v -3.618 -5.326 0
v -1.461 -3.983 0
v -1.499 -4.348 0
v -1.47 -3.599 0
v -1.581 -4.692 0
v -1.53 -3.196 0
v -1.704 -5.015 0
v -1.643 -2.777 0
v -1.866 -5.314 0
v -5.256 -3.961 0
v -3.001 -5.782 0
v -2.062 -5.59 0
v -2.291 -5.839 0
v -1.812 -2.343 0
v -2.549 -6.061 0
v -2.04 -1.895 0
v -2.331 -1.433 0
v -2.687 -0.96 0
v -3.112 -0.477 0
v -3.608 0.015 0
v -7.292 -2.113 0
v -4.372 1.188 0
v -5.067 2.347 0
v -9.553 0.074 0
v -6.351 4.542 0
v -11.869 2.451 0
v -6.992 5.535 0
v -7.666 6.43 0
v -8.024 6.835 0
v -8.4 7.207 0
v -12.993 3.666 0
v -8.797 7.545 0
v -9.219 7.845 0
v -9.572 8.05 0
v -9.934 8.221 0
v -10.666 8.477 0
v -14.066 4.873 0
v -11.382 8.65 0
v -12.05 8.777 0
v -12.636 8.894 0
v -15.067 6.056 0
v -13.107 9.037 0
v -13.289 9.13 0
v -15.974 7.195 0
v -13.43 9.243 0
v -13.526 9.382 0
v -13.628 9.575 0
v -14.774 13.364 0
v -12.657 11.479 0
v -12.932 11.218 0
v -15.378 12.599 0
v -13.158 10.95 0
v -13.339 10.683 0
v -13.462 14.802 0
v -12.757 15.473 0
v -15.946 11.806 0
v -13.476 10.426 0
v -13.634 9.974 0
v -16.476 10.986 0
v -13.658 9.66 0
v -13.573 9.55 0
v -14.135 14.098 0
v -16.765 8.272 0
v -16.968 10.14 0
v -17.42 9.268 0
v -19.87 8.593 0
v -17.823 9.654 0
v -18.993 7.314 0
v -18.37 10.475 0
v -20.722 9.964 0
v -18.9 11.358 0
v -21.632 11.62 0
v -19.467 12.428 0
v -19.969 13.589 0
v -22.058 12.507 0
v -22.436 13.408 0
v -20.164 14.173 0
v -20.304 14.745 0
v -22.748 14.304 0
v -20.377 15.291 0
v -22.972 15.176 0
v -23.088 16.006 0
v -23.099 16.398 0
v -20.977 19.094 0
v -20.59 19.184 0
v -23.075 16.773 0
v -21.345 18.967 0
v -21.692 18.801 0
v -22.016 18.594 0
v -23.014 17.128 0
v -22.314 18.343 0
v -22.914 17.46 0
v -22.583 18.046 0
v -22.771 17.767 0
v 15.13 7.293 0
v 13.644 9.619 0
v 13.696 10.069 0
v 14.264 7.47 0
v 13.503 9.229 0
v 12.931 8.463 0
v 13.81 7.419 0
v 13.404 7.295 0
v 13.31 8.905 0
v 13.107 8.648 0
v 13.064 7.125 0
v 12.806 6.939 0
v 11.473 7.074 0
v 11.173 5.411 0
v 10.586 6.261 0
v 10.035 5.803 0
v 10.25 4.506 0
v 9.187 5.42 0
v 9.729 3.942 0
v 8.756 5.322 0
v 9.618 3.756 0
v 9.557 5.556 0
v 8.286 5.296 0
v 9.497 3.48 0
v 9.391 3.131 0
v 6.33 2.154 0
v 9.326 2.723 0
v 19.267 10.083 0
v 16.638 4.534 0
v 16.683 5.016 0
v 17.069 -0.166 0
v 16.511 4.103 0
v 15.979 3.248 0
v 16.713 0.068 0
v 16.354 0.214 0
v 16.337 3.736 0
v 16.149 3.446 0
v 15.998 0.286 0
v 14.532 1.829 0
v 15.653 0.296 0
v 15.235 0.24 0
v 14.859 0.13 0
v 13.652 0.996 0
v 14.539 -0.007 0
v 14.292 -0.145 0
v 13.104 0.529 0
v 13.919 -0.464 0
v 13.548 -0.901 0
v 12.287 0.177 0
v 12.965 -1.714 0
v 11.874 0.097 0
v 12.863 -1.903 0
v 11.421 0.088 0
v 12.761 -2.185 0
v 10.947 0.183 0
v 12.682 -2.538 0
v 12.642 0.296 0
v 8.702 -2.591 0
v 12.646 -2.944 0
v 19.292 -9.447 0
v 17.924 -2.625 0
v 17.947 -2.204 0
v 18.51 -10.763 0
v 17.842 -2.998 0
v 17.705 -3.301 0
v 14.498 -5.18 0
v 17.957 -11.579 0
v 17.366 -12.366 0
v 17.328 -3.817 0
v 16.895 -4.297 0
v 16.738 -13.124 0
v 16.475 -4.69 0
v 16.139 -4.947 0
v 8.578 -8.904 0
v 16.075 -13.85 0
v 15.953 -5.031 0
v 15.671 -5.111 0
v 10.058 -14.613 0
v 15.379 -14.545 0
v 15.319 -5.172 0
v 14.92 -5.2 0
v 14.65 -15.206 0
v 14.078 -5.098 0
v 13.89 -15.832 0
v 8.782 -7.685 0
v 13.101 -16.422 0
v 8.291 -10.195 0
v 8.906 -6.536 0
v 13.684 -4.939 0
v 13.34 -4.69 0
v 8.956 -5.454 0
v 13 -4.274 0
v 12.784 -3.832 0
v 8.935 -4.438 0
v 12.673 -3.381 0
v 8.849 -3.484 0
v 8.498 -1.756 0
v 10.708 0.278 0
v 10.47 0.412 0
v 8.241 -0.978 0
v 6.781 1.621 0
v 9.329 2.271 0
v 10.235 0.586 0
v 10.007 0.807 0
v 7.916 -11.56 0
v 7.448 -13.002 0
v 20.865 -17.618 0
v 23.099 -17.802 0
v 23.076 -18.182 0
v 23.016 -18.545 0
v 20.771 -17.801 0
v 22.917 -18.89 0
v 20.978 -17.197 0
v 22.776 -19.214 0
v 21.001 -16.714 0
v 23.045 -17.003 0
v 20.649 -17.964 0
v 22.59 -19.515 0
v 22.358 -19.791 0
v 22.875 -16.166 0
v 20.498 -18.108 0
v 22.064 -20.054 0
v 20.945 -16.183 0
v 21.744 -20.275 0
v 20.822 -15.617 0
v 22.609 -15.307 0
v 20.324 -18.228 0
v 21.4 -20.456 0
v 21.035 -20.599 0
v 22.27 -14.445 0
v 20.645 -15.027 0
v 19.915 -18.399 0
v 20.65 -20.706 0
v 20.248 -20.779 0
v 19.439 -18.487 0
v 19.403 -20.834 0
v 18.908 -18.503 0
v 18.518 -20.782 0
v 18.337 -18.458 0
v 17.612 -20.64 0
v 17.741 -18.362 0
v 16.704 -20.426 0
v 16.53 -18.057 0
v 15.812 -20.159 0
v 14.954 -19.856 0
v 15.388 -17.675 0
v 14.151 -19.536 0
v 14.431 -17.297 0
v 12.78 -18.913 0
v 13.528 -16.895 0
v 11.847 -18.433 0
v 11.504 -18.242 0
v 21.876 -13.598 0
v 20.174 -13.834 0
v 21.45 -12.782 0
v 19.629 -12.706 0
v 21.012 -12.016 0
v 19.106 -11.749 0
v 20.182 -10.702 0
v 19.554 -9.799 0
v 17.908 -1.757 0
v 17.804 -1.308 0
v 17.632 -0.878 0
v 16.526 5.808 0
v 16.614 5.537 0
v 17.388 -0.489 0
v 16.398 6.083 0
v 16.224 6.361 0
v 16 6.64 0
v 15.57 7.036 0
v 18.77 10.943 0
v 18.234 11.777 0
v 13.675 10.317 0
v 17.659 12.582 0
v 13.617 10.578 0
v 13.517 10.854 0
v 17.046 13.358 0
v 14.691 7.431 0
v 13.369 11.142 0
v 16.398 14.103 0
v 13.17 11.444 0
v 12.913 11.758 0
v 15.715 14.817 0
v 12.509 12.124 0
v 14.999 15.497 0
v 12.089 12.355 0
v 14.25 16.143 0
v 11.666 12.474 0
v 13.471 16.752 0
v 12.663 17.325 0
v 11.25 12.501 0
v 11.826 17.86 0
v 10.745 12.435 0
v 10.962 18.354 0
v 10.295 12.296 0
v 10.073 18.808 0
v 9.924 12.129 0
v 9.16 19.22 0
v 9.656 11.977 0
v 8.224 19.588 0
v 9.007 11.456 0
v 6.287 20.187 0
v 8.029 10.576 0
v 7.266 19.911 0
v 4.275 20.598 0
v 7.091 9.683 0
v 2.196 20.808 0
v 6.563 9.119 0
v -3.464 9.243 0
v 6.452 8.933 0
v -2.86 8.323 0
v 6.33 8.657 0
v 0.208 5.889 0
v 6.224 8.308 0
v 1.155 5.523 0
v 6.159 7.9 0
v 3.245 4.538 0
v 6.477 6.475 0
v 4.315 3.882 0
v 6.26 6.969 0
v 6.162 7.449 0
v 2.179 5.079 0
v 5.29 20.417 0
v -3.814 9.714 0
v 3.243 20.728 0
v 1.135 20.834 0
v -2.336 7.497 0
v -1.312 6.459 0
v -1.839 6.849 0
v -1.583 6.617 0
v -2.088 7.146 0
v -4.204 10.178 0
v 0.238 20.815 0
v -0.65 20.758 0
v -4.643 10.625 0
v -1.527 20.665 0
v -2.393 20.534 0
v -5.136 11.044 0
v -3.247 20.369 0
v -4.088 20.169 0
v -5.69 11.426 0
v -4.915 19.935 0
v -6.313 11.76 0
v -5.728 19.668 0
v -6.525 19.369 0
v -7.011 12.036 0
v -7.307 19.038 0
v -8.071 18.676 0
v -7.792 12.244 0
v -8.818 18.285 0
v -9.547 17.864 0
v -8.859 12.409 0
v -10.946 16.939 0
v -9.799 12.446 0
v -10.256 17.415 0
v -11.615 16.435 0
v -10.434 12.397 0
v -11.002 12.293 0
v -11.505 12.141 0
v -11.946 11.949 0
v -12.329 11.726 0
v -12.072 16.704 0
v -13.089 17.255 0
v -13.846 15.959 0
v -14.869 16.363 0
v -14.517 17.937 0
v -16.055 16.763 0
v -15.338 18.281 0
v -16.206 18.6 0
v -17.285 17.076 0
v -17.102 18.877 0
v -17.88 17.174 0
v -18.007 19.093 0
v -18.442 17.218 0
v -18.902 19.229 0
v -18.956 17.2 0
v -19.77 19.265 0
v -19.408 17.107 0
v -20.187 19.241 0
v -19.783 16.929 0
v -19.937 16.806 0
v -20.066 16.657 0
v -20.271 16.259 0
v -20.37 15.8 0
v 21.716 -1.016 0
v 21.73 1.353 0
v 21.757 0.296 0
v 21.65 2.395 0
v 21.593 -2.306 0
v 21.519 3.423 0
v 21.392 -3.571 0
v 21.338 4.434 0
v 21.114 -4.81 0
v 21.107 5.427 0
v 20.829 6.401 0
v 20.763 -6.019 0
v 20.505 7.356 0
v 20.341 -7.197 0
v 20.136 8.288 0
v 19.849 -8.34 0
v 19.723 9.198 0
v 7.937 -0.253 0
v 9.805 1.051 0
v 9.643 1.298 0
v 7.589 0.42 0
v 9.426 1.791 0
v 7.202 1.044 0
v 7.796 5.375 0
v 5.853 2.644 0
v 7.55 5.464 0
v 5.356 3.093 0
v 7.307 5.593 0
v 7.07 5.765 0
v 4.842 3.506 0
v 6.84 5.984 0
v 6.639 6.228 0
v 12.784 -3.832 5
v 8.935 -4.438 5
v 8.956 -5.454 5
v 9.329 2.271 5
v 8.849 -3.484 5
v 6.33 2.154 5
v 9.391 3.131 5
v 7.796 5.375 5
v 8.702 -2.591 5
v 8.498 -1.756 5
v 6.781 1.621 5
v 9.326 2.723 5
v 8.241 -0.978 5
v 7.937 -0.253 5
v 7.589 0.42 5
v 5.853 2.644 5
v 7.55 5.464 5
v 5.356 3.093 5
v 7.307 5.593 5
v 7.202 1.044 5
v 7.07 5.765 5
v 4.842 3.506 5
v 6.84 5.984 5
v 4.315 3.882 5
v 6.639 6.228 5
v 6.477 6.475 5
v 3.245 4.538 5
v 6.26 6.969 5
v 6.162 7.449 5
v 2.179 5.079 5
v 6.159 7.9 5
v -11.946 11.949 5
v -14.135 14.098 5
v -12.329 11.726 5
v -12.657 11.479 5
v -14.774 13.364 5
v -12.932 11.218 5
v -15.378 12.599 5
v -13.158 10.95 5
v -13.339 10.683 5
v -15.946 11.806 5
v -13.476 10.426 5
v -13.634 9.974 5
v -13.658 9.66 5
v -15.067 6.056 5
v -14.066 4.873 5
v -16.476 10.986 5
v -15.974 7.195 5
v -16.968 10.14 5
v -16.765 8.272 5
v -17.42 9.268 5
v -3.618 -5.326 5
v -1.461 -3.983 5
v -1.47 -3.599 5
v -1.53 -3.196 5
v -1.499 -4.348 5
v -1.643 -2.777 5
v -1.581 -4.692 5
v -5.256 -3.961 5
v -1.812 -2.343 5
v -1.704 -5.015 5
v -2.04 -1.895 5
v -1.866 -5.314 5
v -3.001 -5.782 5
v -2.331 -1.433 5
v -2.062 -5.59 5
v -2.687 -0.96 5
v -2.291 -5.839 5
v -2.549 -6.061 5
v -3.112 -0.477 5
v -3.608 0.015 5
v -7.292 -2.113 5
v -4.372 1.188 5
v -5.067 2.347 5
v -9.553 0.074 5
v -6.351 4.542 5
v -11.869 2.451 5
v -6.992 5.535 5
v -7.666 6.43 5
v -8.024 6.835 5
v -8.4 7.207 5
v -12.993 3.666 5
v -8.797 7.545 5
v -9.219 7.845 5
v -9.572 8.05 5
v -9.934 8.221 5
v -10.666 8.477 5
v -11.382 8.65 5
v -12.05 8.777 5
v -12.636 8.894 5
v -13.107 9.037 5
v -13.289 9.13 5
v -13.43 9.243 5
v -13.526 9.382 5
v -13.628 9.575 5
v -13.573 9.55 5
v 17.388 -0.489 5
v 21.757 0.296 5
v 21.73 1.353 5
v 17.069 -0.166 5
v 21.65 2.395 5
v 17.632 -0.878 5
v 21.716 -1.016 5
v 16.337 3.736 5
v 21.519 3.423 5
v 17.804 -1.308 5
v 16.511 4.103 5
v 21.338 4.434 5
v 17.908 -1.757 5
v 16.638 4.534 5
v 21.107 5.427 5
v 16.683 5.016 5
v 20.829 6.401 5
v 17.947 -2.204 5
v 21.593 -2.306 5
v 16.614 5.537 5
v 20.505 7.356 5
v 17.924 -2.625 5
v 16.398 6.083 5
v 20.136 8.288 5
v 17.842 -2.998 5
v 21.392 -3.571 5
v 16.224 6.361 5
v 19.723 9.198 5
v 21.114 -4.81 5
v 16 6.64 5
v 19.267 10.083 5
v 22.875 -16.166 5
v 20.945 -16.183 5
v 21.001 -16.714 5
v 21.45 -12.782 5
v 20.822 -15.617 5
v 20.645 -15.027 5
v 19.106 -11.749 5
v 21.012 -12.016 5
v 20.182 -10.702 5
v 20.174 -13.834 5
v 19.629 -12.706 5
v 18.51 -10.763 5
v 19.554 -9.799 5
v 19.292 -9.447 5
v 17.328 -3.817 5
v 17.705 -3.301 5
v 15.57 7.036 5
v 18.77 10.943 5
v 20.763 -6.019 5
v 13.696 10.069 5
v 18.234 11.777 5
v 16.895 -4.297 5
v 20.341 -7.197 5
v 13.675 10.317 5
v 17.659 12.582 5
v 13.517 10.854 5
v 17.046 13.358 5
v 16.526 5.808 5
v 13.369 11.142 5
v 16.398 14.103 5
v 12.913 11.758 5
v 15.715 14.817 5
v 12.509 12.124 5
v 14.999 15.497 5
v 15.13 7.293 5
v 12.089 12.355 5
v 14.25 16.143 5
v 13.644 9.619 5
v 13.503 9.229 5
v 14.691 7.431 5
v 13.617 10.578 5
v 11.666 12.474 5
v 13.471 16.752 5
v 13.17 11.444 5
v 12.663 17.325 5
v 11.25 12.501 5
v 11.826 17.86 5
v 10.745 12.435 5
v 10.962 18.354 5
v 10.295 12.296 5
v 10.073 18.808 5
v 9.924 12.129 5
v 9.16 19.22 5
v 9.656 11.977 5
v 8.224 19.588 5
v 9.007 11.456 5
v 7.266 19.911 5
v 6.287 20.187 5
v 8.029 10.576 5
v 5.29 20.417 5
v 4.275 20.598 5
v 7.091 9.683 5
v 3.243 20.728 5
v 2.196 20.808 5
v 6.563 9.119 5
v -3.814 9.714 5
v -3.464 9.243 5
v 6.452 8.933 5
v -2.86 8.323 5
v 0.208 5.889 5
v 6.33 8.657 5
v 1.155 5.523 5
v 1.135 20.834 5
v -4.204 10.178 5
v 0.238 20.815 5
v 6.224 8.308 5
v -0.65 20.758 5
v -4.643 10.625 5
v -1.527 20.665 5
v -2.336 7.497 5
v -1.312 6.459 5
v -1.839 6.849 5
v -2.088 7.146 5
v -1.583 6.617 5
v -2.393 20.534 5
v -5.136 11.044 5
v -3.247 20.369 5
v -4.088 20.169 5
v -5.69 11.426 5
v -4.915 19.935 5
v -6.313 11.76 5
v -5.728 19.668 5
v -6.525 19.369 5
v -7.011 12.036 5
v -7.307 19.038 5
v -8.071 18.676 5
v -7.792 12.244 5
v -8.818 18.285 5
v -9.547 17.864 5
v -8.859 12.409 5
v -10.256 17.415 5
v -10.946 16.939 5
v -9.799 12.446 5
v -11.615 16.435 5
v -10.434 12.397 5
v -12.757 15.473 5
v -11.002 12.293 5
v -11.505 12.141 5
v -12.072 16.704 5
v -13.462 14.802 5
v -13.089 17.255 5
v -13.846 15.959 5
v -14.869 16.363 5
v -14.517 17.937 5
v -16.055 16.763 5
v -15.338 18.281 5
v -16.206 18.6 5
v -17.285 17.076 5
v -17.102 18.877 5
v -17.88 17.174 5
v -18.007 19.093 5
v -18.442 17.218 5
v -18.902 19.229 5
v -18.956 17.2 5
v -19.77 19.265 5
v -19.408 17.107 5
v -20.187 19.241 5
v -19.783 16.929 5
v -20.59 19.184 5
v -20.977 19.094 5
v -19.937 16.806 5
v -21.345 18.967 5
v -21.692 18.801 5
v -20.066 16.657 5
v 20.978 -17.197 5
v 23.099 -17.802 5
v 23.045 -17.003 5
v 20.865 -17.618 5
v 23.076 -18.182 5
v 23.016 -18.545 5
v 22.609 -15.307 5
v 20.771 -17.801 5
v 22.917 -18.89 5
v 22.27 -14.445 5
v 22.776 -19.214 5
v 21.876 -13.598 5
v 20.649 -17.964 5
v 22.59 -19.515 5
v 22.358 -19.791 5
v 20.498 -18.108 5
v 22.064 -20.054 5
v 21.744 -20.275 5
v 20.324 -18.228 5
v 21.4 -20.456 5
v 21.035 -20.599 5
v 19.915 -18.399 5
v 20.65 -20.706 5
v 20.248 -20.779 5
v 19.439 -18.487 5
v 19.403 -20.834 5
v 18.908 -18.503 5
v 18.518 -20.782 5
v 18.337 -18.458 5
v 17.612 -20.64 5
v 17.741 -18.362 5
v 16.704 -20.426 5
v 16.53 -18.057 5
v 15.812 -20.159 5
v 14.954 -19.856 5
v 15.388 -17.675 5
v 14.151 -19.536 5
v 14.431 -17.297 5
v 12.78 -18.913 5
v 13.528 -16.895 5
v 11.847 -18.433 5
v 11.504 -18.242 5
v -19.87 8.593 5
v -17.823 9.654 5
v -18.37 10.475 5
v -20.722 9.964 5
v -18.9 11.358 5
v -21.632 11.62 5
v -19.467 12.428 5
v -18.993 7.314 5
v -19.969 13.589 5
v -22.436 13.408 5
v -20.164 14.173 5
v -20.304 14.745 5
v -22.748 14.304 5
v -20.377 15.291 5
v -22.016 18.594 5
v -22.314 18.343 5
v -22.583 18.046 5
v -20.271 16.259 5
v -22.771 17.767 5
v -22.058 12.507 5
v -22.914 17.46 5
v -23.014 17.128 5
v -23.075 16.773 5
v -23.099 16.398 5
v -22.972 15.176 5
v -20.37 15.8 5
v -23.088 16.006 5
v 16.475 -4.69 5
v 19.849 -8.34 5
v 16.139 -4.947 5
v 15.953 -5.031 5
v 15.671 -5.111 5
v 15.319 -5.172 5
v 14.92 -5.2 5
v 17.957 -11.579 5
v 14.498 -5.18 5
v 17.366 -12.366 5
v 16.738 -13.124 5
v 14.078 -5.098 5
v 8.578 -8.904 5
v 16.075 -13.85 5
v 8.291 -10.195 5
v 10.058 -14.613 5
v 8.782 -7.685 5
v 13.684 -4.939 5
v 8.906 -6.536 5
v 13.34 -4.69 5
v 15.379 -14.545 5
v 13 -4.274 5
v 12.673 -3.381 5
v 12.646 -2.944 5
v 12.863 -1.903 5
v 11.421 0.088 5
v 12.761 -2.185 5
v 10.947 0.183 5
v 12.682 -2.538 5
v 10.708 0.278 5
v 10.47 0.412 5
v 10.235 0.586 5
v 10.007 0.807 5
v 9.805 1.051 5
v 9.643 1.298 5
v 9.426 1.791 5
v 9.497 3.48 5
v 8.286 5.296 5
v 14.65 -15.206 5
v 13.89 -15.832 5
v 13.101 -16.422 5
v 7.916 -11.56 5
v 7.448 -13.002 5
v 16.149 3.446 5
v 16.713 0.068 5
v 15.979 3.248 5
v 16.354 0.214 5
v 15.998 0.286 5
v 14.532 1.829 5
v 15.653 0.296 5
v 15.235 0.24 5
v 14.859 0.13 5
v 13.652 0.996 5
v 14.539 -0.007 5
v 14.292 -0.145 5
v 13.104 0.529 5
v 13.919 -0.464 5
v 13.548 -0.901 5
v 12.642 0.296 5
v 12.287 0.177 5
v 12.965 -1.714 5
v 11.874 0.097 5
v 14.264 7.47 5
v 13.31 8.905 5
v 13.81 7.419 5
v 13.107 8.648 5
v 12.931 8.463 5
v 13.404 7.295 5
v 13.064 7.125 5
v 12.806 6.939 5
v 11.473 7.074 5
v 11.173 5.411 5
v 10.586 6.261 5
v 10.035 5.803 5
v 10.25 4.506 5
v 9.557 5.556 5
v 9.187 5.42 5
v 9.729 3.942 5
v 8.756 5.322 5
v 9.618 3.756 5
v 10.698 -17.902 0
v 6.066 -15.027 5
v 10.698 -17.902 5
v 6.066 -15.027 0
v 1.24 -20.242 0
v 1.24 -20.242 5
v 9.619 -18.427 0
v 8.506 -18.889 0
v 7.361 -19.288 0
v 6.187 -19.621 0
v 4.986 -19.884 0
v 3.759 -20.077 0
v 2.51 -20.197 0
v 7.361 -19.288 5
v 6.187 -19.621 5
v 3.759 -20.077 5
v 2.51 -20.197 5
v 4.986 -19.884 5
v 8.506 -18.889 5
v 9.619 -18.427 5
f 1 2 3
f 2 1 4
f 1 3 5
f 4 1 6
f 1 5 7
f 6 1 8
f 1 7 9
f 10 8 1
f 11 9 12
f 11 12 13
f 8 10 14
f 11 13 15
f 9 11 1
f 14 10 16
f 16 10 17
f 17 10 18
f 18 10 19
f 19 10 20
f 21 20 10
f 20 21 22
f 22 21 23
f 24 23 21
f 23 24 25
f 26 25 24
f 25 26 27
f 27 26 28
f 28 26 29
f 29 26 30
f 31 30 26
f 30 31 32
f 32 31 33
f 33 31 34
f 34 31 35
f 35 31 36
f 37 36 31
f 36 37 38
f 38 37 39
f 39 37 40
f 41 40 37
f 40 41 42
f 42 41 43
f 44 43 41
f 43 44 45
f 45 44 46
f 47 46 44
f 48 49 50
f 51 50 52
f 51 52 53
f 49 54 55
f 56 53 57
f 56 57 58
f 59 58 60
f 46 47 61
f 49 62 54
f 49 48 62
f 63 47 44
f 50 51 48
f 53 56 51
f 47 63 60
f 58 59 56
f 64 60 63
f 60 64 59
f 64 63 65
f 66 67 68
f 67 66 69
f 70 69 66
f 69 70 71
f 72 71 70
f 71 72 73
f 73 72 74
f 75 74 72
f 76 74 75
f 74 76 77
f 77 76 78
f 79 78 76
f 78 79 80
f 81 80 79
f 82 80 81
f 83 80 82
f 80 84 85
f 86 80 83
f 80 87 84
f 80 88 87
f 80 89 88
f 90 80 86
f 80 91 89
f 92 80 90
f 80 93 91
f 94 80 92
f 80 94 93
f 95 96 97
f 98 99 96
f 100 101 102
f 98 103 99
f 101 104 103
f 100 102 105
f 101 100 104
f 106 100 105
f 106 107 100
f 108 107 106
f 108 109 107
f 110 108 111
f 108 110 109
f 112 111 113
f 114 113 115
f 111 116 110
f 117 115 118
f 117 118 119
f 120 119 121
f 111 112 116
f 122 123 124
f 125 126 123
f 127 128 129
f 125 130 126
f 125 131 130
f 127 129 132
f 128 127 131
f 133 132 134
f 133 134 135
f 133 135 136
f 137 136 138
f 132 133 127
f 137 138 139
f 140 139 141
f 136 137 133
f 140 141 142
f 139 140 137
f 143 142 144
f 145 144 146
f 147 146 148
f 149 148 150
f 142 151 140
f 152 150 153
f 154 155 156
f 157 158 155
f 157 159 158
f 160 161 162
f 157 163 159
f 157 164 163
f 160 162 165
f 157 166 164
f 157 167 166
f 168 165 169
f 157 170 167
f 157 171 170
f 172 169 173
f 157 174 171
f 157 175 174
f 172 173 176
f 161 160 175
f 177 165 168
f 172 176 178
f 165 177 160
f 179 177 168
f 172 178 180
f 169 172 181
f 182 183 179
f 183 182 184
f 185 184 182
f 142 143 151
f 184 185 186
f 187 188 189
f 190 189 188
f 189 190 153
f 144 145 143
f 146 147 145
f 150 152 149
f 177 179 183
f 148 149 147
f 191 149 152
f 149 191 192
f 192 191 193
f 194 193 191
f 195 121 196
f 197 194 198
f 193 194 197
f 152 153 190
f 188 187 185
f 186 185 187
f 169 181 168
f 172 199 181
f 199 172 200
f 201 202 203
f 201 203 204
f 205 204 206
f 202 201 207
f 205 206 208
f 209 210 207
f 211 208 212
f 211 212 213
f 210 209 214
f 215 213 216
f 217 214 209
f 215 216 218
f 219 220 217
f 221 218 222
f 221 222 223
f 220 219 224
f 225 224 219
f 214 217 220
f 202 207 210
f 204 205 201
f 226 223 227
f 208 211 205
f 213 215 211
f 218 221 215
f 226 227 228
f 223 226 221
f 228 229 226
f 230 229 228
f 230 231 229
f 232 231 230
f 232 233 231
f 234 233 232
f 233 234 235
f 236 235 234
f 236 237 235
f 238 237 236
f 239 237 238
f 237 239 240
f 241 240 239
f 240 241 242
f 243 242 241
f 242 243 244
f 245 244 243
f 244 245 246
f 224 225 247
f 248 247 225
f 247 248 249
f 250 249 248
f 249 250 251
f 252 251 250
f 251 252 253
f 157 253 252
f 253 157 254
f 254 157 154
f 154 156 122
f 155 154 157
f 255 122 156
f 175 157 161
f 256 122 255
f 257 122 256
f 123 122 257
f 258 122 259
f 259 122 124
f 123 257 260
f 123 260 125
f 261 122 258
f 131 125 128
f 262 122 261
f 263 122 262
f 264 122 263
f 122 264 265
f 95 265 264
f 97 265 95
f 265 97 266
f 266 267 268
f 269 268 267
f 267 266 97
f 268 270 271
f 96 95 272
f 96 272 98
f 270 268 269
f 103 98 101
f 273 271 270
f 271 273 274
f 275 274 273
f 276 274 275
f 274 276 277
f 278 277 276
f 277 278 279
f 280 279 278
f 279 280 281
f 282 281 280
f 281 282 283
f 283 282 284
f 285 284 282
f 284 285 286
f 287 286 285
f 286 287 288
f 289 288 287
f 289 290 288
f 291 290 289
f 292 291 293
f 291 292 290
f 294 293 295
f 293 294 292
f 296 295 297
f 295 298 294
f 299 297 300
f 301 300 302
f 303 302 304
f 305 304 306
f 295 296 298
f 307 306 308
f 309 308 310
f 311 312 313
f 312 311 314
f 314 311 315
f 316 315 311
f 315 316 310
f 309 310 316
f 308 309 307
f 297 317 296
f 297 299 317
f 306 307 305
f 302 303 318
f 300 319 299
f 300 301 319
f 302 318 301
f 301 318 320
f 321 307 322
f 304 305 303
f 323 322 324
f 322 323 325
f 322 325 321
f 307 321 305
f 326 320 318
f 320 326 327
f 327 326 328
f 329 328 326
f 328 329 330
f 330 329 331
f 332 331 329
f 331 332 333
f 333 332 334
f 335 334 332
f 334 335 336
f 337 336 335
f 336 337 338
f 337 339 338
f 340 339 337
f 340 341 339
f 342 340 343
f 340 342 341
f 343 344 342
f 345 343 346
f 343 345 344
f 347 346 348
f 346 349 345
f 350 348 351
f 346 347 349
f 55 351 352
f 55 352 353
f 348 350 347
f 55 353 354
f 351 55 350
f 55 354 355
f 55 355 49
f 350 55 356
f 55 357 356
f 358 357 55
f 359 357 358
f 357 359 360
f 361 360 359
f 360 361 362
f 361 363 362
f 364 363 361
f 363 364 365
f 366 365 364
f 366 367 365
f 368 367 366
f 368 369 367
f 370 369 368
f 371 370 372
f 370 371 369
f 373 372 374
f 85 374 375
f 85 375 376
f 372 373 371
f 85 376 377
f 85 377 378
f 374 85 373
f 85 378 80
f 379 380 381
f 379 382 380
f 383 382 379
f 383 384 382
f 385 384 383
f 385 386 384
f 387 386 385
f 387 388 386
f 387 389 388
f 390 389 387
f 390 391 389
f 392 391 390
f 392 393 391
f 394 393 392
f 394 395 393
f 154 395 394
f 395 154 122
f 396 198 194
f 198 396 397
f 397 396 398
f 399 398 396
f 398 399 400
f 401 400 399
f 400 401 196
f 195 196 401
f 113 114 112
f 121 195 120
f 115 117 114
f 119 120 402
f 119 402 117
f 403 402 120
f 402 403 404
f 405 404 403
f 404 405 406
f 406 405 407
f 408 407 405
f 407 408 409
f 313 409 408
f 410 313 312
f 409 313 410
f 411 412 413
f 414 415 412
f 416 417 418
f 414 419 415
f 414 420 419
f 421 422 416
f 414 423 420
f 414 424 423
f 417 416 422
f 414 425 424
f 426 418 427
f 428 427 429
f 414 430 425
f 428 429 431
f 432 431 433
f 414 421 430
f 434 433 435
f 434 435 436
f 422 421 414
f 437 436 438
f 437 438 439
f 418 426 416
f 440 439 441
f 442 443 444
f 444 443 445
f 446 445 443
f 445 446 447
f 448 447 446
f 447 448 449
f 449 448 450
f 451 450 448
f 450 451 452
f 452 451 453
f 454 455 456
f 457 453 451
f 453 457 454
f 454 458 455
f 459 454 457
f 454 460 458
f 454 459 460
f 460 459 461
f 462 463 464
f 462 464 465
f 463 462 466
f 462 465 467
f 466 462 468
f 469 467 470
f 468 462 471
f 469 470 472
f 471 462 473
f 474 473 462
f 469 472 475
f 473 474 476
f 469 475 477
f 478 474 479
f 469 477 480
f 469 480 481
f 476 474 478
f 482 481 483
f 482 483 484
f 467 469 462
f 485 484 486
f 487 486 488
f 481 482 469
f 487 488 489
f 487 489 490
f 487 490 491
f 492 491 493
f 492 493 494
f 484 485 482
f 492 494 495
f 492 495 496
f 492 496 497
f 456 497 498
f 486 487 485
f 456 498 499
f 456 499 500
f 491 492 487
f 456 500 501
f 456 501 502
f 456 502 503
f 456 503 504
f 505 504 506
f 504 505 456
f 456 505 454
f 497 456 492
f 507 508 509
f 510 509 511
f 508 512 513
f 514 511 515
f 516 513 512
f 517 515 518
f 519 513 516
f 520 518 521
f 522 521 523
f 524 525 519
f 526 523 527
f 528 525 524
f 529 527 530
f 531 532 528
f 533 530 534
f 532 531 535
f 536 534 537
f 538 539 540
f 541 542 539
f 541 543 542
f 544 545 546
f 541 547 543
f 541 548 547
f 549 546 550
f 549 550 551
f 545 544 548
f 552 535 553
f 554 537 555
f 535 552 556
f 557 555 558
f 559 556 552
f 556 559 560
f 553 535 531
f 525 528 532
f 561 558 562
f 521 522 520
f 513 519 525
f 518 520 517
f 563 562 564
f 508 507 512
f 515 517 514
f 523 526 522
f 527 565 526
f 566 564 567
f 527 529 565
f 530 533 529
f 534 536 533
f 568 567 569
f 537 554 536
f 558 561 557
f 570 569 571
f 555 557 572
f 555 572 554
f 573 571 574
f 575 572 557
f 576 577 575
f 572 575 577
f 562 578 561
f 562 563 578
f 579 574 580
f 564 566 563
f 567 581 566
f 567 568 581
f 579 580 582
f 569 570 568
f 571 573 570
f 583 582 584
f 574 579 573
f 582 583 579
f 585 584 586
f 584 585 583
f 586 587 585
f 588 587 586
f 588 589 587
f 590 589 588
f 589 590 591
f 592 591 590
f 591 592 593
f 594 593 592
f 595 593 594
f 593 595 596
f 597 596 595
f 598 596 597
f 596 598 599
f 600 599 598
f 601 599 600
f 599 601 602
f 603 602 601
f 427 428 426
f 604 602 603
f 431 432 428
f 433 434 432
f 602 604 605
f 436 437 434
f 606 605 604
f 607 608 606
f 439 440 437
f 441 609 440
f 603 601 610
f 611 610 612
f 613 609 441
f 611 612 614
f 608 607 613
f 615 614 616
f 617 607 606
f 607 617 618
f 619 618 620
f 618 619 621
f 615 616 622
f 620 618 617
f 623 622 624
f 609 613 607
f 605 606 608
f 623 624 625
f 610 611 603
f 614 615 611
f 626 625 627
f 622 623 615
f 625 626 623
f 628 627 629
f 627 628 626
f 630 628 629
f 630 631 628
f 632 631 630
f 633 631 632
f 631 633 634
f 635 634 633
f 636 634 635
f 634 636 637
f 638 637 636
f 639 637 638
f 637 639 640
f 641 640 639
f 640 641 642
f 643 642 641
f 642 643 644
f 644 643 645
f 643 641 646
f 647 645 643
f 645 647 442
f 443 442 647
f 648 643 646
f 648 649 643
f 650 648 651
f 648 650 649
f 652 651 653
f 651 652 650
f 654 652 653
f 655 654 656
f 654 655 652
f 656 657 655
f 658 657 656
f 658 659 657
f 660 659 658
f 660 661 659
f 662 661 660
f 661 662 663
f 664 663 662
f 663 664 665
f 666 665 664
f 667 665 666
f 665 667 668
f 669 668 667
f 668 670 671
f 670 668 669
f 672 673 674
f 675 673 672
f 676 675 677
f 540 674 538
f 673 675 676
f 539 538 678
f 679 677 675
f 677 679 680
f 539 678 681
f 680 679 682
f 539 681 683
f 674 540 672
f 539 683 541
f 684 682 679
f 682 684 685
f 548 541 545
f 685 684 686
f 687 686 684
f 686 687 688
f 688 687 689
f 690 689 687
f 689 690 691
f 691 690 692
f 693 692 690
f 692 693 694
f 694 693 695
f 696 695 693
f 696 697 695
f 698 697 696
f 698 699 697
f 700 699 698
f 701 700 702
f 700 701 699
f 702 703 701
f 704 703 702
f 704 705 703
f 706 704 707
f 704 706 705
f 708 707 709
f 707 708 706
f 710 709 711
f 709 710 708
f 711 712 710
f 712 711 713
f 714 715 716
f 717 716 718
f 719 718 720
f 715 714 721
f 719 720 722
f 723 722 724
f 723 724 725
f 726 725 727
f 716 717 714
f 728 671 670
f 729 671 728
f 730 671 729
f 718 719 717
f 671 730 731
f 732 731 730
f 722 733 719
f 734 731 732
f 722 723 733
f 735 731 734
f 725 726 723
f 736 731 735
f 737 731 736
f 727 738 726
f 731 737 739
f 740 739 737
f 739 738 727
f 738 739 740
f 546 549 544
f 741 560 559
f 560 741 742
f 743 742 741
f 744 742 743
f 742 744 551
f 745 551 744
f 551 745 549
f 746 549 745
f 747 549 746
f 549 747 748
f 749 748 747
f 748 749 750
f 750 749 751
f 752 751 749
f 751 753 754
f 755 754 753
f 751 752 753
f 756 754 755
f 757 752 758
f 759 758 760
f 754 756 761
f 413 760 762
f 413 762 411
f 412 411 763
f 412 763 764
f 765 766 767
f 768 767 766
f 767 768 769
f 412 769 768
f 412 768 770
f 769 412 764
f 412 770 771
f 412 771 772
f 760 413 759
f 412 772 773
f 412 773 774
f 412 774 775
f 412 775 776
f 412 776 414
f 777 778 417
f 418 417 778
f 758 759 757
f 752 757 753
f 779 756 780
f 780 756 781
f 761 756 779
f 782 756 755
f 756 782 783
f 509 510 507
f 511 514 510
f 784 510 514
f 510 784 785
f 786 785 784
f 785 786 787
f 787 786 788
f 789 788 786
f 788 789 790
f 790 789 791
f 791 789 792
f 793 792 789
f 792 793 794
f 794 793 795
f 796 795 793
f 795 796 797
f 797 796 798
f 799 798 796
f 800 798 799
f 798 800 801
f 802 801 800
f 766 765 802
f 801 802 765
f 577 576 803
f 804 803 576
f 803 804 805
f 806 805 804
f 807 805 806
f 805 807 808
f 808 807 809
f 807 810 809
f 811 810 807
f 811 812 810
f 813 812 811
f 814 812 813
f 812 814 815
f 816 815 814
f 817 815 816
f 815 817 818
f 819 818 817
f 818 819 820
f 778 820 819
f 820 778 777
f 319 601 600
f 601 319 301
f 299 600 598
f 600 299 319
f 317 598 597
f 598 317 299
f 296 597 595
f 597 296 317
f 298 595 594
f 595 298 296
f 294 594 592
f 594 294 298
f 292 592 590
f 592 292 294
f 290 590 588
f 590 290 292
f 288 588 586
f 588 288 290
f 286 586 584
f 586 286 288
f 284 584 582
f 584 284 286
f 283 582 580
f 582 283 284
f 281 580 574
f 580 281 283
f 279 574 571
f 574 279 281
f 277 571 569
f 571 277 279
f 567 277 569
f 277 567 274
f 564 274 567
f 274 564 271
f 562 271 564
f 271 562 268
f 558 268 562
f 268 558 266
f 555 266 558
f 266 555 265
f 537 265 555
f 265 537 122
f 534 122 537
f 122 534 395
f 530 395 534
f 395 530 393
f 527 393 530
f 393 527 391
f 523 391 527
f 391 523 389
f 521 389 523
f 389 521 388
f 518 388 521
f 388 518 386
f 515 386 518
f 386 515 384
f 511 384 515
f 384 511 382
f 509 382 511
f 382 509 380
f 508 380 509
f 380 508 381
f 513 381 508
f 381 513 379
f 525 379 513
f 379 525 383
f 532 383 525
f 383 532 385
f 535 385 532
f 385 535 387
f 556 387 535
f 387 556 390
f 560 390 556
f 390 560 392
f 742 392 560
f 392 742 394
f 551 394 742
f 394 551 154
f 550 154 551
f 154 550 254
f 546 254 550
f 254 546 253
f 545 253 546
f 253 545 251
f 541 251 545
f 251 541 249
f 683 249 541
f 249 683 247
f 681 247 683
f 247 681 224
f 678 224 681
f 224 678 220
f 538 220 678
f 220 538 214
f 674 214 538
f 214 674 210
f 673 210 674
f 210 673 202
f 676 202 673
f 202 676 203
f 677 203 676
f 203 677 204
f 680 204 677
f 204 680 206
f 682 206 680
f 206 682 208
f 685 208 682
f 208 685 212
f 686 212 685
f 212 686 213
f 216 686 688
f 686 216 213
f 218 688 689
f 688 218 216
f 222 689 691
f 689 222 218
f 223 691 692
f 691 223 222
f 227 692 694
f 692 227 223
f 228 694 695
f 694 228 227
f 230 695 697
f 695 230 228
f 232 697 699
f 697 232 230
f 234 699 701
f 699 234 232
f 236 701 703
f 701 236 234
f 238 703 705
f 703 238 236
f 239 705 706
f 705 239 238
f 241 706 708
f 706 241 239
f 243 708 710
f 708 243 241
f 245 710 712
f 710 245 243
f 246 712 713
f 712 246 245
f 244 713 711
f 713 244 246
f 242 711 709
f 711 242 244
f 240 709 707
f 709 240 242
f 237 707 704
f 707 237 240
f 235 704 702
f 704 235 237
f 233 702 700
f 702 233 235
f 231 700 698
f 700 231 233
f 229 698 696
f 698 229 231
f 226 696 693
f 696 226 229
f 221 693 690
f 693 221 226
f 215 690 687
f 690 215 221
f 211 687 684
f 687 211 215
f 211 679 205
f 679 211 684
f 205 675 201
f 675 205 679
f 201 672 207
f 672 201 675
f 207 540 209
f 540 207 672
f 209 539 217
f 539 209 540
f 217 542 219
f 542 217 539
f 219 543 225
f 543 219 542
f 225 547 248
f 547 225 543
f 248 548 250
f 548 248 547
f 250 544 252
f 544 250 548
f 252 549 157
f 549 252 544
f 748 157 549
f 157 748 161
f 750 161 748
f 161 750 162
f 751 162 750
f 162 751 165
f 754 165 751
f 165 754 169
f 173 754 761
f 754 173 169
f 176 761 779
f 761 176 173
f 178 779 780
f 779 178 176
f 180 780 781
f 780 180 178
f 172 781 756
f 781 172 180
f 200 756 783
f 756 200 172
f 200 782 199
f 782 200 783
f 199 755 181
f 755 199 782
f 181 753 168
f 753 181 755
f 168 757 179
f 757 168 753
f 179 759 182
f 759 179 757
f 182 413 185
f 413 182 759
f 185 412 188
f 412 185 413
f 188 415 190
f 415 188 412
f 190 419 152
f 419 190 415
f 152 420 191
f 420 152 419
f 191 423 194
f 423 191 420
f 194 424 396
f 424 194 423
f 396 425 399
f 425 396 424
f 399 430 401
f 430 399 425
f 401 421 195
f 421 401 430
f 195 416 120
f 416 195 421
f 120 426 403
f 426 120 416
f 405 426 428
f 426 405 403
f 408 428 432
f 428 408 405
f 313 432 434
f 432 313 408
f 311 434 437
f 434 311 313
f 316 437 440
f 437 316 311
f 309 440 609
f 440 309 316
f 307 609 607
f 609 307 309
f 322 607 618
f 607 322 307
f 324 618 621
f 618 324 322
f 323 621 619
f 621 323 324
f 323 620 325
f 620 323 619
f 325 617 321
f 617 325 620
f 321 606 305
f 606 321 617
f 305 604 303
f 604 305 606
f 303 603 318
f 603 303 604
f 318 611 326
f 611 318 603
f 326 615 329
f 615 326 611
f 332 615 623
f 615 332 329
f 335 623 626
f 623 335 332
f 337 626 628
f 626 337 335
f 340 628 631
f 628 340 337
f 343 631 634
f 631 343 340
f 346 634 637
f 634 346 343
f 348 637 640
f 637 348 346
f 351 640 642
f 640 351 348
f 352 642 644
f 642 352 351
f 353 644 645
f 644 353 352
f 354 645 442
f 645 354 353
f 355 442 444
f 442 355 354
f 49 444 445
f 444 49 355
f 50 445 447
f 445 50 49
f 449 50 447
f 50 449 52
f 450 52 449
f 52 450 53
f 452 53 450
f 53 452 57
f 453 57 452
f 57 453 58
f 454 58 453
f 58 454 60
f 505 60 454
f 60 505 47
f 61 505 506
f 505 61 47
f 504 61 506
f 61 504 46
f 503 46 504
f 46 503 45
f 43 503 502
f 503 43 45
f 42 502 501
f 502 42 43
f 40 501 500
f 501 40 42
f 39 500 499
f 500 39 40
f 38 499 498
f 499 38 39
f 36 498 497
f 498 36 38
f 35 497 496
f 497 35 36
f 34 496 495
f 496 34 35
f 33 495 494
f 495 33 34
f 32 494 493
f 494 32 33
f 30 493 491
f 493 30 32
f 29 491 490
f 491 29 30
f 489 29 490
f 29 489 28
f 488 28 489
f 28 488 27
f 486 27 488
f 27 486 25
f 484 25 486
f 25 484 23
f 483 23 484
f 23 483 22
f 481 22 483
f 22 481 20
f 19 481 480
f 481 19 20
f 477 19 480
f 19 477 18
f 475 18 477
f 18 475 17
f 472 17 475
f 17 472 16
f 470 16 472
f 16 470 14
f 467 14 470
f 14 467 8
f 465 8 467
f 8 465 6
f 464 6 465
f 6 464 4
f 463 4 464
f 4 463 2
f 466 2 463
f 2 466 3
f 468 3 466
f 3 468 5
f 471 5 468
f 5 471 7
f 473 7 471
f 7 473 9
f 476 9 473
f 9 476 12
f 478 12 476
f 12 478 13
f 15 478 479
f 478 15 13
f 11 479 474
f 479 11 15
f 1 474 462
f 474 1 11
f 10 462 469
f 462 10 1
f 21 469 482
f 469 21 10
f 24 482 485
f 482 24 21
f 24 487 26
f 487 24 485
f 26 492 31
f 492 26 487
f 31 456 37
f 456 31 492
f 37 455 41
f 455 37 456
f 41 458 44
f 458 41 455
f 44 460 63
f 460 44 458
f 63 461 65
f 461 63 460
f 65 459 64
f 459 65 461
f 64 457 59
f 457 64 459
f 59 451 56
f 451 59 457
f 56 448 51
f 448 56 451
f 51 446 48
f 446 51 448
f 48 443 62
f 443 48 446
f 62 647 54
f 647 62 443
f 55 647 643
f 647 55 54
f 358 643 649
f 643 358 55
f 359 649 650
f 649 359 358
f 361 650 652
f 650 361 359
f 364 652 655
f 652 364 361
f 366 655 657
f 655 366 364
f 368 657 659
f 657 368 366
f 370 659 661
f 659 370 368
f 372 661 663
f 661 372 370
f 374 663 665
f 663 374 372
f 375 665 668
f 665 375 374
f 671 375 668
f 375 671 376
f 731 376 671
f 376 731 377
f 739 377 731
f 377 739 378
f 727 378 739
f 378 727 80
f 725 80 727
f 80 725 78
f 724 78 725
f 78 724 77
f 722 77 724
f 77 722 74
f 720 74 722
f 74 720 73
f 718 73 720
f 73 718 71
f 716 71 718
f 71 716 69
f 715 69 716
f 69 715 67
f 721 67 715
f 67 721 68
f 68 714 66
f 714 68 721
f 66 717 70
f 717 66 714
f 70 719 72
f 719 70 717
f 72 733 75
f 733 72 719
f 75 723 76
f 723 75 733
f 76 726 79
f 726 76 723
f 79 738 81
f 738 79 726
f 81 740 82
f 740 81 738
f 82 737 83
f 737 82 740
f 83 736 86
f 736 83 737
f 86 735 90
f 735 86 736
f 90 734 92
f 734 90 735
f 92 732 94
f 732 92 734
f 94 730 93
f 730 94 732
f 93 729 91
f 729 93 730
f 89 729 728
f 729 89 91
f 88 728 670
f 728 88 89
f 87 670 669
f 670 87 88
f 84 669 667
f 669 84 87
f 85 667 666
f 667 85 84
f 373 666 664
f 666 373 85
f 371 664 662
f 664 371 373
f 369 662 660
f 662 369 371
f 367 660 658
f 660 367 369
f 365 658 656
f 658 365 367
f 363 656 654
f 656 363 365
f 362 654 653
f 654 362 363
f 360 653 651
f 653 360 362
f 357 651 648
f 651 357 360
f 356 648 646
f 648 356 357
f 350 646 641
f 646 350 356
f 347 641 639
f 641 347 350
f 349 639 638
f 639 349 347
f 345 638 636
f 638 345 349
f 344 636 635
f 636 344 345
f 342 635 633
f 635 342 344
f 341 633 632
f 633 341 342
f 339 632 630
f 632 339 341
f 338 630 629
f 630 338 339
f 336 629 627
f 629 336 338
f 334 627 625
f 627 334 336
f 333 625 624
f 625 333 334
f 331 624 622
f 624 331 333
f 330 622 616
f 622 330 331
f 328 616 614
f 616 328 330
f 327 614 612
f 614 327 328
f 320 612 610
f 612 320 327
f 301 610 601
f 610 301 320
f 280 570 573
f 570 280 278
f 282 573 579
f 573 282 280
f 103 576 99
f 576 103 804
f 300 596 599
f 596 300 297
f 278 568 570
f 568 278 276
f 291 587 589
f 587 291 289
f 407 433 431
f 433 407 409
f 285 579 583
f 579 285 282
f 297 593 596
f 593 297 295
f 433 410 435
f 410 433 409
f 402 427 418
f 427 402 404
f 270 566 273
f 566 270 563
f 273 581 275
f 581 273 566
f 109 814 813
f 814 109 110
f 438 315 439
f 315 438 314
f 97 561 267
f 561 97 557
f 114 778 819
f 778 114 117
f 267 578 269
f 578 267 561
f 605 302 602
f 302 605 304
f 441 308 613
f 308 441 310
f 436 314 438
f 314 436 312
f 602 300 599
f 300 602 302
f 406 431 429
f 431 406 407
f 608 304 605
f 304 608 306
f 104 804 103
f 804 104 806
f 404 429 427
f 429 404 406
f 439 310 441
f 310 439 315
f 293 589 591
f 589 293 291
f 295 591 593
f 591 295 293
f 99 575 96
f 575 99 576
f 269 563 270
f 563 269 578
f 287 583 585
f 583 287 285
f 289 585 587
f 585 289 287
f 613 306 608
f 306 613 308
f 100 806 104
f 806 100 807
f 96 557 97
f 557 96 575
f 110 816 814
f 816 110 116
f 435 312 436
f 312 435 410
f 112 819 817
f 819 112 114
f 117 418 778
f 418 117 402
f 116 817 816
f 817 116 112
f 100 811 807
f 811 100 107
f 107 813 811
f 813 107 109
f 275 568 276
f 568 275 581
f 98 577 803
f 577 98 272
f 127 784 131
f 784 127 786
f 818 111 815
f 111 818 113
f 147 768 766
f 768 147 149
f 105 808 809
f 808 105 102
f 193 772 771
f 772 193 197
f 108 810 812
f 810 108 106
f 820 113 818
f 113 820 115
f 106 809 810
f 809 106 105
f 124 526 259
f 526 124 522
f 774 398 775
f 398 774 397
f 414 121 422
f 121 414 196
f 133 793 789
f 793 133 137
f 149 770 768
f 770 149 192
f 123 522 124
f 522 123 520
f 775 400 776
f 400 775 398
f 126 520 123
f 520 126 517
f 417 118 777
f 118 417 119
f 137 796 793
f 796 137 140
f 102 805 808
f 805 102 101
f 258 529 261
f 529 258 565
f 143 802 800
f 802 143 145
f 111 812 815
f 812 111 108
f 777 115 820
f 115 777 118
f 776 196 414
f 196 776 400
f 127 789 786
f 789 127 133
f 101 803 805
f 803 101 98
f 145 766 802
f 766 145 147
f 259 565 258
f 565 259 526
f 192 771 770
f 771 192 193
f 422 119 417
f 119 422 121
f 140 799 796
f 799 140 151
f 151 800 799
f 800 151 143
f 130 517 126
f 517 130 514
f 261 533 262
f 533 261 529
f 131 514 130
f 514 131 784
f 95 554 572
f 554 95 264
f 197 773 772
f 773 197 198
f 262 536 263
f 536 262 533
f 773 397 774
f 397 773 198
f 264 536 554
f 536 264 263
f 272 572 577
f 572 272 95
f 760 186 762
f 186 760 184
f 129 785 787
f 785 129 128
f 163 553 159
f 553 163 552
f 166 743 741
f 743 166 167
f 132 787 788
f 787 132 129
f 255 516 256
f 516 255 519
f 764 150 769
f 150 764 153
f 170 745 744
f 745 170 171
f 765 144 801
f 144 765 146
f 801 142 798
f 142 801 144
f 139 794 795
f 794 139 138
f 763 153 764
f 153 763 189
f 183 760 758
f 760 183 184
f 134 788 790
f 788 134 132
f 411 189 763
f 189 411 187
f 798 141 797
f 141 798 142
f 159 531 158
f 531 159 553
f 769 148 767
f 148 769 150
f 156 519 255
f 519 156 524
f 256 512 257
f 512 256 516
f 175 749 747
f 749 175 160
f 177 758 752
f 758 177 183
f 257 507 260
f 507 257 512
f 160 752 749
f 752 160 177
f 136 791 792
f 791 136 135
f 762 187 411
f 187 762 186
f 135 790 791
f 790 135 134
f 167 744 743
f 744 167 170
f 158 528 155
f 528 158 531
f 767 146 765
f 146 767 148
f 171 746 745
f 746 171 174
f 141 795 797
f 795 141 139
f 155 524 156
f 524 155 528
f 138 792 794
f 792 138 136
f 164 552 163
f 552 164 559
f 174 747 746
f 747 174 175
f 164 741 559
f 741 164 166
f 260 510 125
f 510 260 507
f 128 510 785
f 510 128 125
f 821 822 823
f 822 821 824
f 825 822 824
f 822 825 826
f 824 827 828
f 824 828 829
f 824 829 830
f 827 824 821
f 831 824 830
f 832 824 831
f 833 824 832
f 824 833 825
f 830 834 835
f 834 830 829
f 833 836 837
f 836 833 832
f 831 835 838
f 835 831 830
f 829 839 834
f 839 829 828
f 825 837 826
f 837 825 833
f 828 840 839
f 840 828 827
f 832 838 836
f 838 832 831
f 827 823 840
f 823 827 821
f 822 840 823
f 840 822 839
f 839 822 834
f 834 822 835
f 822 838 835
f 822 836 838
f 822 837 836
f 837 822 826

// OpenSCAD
// Module names are of the form poly_<inkscape-path-id>().  As a result,
// you can associate a polygon in this OpenSCAD program with the corresponding
// SVG element in the Inkscape document by looking for the XML element with
// the attribute id="inkscape-path-id".

// fudge value is used to ensure that subtracted solids are a tad taller
// in the z dimension than the polygon being subtracted from.  This helps
// keep the resulting .stl file manifold.
fudge = 0.1;

module poly_path1933(h)
{
  scale([10/90, -10/90, 1]) union()
  {
    difference()
    {
       linear_extrude(height=h)
         polygon([[10.219061,-187.510070],[2.140276,-187.337795],[-5.850477,-186.825669],[-13.746149,-185.980735],[-21.539693,-184.810038],[-29.224062,-183.320622],[-36.792208,-181.519532],[-44.237083,-179.413811],[-51.551640,-177.010506],[-58.728832,-174.316659],[-65.761610,-171.339316],[-72.642928,-168.085521],[-79.365737,-164.562318],[-85.922990,-160.776752],[-92.307640,-156.735867],[-98.512639,-152.446708],[-104.530939,-147.916320],[-108.643908,-150.339376],[-117.799632,-155.297892],[-130.652002,-161.436915],[-138.043770,-164.525694],[-145.854908,-167.401493],[-153.917152,-169.894943],[-162.062239,-171.836675],[-170.121906,-173.057320],[-177.927887,-173.387508],[-181.683163,-173.165753],[-185.311920,-172.657871],[-188.793123,-171.842690],[-192.105740,-170.699040],[-195.228738,-169.205749],[-198.141085,-167.341646],[-200.821746,-165.085560],[-203.249689,-162.416320],[-204.939125,-159.900181],[-206.224820,-157.137685],[-207.129733,-154.150228],[-207.676825,-150.959204],[-207.889056,-147.586006],[-207.789386,-144.052029],[-206.746180,-136.587314],[-204.730887,-128.736213],[-201.927186,-120.669879],[-198.518756,-112.559467],[-194.689278,-104.576130],[-186.501890,-89.675294],[-178.834457,-77.336603],[-170.937189,-65.822570],[-160.405939,-86.885070],[-165.325625,-94.278709],[-170.103495,-102.225439],[-175.207394,-111.854046],[-179.722830,-122.300984],[-181.474095,-127.561469],[-182.735310,-132.702707],[-183.392164,-137.616754],[-183.330344,-142.195668],[-182.435540,-146.331504],[-180.593439,-149.916320],[-179.431428,-151.253010],[-178.046295,-152.364681],[-174.672846,-153.959879],[-170.605466,-154.795753],[-165.976531,-154.966141],[-160.918414,-154.564882],[-155.563490,-153.685813],[-144.492717,-150.869602],[-133.823206,-147.268215],[-124.613951,-143.632359],[-114.812189,-139.260070],[-121.158440,-133.217036],[-127.213080,-126.884229],[-132.964751,-120.272614],[-138.402090,-113.393161],[-143.513739,-106.256837],[-148.288337,-98.874610],[-152.714524,-91.257448],[-156.780939,-83.416320],[-150.887829,-74.445129],[-143.763448,-64.752548],[-135.601007,-54.503106],[-126.593717,-43.861335],[-116.934792,-32.991765],[-106.817442,-22.058927],[-85.980315,-0.661570],[-65.628033,19.014491],[-47.306288,35.653008],[-32.560775,47.937737],[-27.012135,52.036103],[-22.937189,54.552430],[-20.618515,52.550424],[-18.561180,50.305720],[-16.792451,47.829869],[-15.339594,45.134421],[-14.229876,42.230928],[-13.490564,39.130939],[-13.148925,35.846006],[-13.232224,32.387678],[-13.767730,28.767506],[-14.782708,24.997042],[-16.304426,21.087835],[-18.360149,17.051436],[-20.977146,12.899395],[-24.182682,8.643264],[-28.004024,4.294592],[-32.468439,-0.135070],[-39.349251,-10.690683],[-45.602924,-21.125286],[-57.158380,-40.875183],[-62.924929,-49.812340],[-68.993866,-57.872211],[-72.214351,-61.514080],[-75.597576,-64.865727],[-79.172589,-67.903518],[-82.968439,-70.603820],[-86.147713,-72.451296],[-89.402915,-73.988218],[-95.992585,-76.295047],[-102.440417,-77.853601],[-108.449382,-78.993175],[-113.722447,-80.043063],[-117.962582,-81.332562],[-119.602479,-82.170070],[-120.872757,-83.190966],[-121.736286,-84.436412],[-122.155939,-85.947570],[-122.650334,-86.178320],[-122.926142,-86.941334],[-122.710223,-89.767714],[-121.284629,-93.833839],[-120.048344,-96.146532],[-118.425808,-98.546835],[-116.389077,-100.960636],[-113.910206,-103.313828],[-110.961252,-105.532302],[-107.514271,-107.541947],[-103.541318,-109.268656],[-99.014450,-110.638319],[-93.905721,-111.576826],[-88.187189,-112.010070],[-79.734032,-111.683157],[-70.124689,-110.197570],[-63.102340,-108.325741],[-56.819062,-105.840139],[-51.212991,-102.832800],[-46.222263,-99.395757],[-41.785017,-95.621045],[-37.839388,-91.600700],[-34.323514,-87.426756],[-31.175532,-83.191248],[-25.735789,-74.903681],[-21.025254,-67.474276],[-18.788782,-64.311471],[-16.549022,-61.639312],[-14.244113,-59.549834],[-11.812189,-58.135070],[1.873026,-53.001055],[10.398086,-49.706225],[19.615493,-45.707115],[29.203279,-40.839424],[38.839478,-34.938854],[43.575118,-31.549895],[48.202124,-27.841103],[52.680249,-23.791942],[56.969250,-19.381873],[61.028878,-14.590360],[64.818889,-9.396864],[68.299037,-3.780849],[71.429076,2.278223],[74.168760,8.800890],[76.477843,15.807689],[78.316080,23.319157],[79.643225,31.355833],[80.419031,39.938253],[80.603254,49.086954],[80.155646,58.822475],[79.035964,69.165353],[77.203960,80.136125],[74.619388,91.755328],[71.242004,104.043501],[67.031561,117.021180],[90.524648,131.515304],[117.906561,147.802430],[125.011310,142.488831],[131.849820,136.852295],[138.409665,130.903778],[144.678421,124.654237],[150.643663,118.114626],[156.292967,111.295901],[161.613908,104.209017],[166.594061,96.864930],[171.954118,105.740684],[176.660966,114.354632],[181.565050,124.502373],[185.800885,135.246215],[187.397745,140.548645],[188.502987,145.648466],[189.008425,150.428466],[188.805874,154.771435],[187.787148,158.560160],[186.937911,160.210053],[185.844061,161.677430],[184.480052,162.975537],[182.913786,164.052470],[179.238900,165.590026],[174.948229,166.384513],[170.170605,166.530345],[165.034854,166.121939],[159.669806,165.253709],[148.767135,162.515438],[138.493219,159.070854],[129.878690,155.675277],[121.750311,152.052430],[103.531561,164.177430],[106.627491,165.901445],[115.018393,170.212786],[127.358925,175.820385],[134.589882,178.706823],[142.303745,181.433177],[150.332343,183.838061],[158.507510,185.760094],[166.661078,187.037891],[174.624880,187.510070],[182.230746,187.015246],[185.846902,186.354776],[189.310511,185.392037],[192.600552,184.106856],[195.696005,182.479060],[198.575848,180.488476],[201.219061,178.114930],[203.313995,175.631201],[204.984466,172.921538],[206.253840,170.005791],[207.145484,166.903808],[207.682768,163.635438],[207.889056,160.220528],[207.402121,153.030486],[205.871618,145.492469],[203.484487,137.765265],[200.427666,130.007661],[196.888097,122.378444],[193.052718,115.036403],[189.108469,108.140325],[181.641118,96.321208],[175.981560,88.191393],[173.625311,85.021180],[178.644761,75.061368],[183.066758,64.771302],[186.869169,54.173092],[190.029863,43.288845],[192.526707,32.140672],[194.337568,20.750681],[195.440313,9.140981],[195.812811,-2.666320],[195.571175,-12.173577],[194.854059,-21.556570],[193.673151,-30.803656],[192.040142,-39.903191],[189.966719,-48.843531],[187.464572,-57.613031],[184.545389,-66.200049],[181.220859,-74.592939],[177.502672,-82.780059],[173.402515,-90.749764],[168.932077,-98.490410],[164.103048,-105.990354],[158.927117,-113.237951],[153.415972,-120.221558],[147.581301,-126.929530],[141.434795,-133.350225],[134.988141,-139.471997],[128.253028,-145.283203],[121.241146,-150.772199],[113.964183,-155.927342],[106.433829,-160.736986],[98.661771,-165.189489],[90.659698,-169.273207],[82.439300,-172.976495],[74.012266,-176.287710],[65.390284,-179.195207],[56.585042,-181.687343],[47.608231,-183.752474],[38.471538,-185.378956],[29.186653,-186.555146],[19.765264,-187.269398],[10.219061,-187.510070]]);
       translate([0, 0, -fudge])
         linear_extrude(height=h+2*fudge)
           polygon([[101.250311,-112.510070],[104.990131,-112.265730],[108.799602,-111.196356],[112.576615,-109.111964],[116.219061,-105.822570],[118.528724,-102.994803],[120.324813,-100.280082],[121.651670,-97.682019],[122.553632,-95.204225],[123.075042,-92.850312],[123.260238,-90.623892],[122.799352,-86.567975],[121.525695,-83.065366],[119.793989,-80.144959],[117.958954,-77.835646],[116.375311,-76.166320],[103.260361,-63.661856],[95.270263,-56.345728],[90.312811,-52.228820],[86.014804,-50.000441],[82.681363,-48.782568],[78.804731,-47.902155],[74.569734,-47.664136],[70.161198,-48.373450],[67.949610,-49.178649],[65.763948,-50.335033],[63.627314,-51.880717],[61.562811,-53.853820],[59.747774,-56.054606],[58.291325,-58.276698],[56.336406,-62.716582],[55.462482,-67.037035],[55.433982,-71.101622],[56.015336,-74.773905],[56.970973,-77.917449],[58.065321,-80.395816],[59.062811,-82.072570],[63.818097,-87.143729],[72.259117,-95.187908],[81.062921,-103.104106],[86.906561,-107.791320],[89.311610,-109.160177],[92.650800,-110.667137],[96.703808,-111.915876],[101.250311,-112.510070]]);
       translate([0, 0, -fudge])
         linear_extrude(height=h+2*fudge)
           polygon([[128.375311,-67.228820],[132.214908,-66.877410],[136.167550,-65.633407],[140.130322,-63.319923],[144.000311,-59.760070],[146.011833,-57.246183],[147.578590,-54.743953],[148.738084,-52.268188],[149.527812,-49.833695],[150.147974,-45.147754],[149.739075,-40.804587],[148.601111,-36.922652],[147.034080,-33.620408],[145.337981,-31.016311],[143.812811,-29.228820],[130.791603,-16.458735],[122.865963,-8.959987],[117.937811,-4.760070],[113.776523,-2.668410],[110.583218,-1.590674],[106.867231,-0.870905],[102.792878,-0.793531],[98.524479,-1.642981],[96.368861,-2.504150],[94.226350,-3.703685],[92.117487,-5.277140],[90.062811,-7.260070],[88.247774,-9.460856],[86.791325,-11.682948],[84.836406,-16.122832],[83.962482,-20.443285],[83.933982,-24.507872],[84.515336,-28.180155],[85.470973,-31.323699],[86.565321,-33.802066],[87.562811,-35.478820],[92.246484,-40.549838],[100.555127,-48.697950],[115.250311,-62.447570],[117.575063,-64.127522],[120.640141,-65.653861],[124.291553,-66.772366],[128.375311,-67.228820]]);
       translate([0, 0, -fudge])
         linear_extrude(height=h+2*fudge)
           polygon([[140.875311,-2.666320],[143.982667,-2.571476],[147.181720,-1.924383],[150.415068,-0.609197],[153.625311,1.489930],[156.493764,4.404498],[158.688445,7.897750],[160.238581,11.767884],[161.173401,15.813097],[161.522131,19.831586],[161.314000,23.621548],[160.578234,26.981180],[159.344061,29.708680],[155.954039,34.352962],[152.056031,38.672497],[148.278600,42.213248],[145.250311,44.521180],[143.574753,45.283321],[141.042491,46.003387],[137.871467,46.552243],[134.279621,46.800755],[130.484892,46.619790],[126.705220,45.880211],[123.158547,44.452886],[120.062811,42.208680],[116.997139,38.470006],[115.057353,34.485127],[114.058195,30.433007],[113.814407,26.492605],[114.140733,22.842885],[114.851913,19.662809],[115.762692,17.131336],[116.687811,15.427430],[121.930992,8.108967],[125.267023,4.178121],[128.625311,1.302430],[130.854746,0.059884],[133.726767,-1.174072],[137.110560,-2.161965],[140.875311,-2.666320]]);
    }
    linear_extrude(height=h)
      polygon([[-166.218439,-60.166320],[-170.158251,-46.367250],[-173.026918,-32.155156],[-174.780408,-17.573644],[-175.374689,-2.666320],[-175.069146,8.020936],[-174.163617,18.549246],[-172.674753,28.902007],[-170.619205,39.062615],[-168.013624,49.014469],[-164.874661,58.740966],[-161.218966,68.225503],[-157.063190,77.451477],[-152.423985,86.402285],[-147.318001,95.061325],[-141.761889,103.411994],[-135.772300,111.437690],[-129.365885,119.121809],[-122.559294,126.447749],[-115.369178,133.398907],[-107.812189,139.958680],[-70.773432,103.867518],[-37.499689,71.052430],[-64.353014,47.245986],[-82.404639,30.672409],[-101.786232,12.289894],[-121.182788,-6.923085],[-139.279303,-25.988054],[-147.429106,-35.159263],[-154.760771,-43.926541],[-161.109924,-52.167579],[-166.312189,-59.760070],[-166.218489,-60.166320]]);
    linear_extrude(height=h)
      polygon([[54.594061,135.239930],[11.156561,182.177430],[22.587878,181.775099],[33.832838,180.695585],[44.871662,178.958840],[55.684575,176.584814],[66.251798,173.593459],[76.553555,170.004726],[86.570068,165.838566],[96.281561,161.114930],[54.594061,135.239930]]);
  }
}

poly_path1933(5);
